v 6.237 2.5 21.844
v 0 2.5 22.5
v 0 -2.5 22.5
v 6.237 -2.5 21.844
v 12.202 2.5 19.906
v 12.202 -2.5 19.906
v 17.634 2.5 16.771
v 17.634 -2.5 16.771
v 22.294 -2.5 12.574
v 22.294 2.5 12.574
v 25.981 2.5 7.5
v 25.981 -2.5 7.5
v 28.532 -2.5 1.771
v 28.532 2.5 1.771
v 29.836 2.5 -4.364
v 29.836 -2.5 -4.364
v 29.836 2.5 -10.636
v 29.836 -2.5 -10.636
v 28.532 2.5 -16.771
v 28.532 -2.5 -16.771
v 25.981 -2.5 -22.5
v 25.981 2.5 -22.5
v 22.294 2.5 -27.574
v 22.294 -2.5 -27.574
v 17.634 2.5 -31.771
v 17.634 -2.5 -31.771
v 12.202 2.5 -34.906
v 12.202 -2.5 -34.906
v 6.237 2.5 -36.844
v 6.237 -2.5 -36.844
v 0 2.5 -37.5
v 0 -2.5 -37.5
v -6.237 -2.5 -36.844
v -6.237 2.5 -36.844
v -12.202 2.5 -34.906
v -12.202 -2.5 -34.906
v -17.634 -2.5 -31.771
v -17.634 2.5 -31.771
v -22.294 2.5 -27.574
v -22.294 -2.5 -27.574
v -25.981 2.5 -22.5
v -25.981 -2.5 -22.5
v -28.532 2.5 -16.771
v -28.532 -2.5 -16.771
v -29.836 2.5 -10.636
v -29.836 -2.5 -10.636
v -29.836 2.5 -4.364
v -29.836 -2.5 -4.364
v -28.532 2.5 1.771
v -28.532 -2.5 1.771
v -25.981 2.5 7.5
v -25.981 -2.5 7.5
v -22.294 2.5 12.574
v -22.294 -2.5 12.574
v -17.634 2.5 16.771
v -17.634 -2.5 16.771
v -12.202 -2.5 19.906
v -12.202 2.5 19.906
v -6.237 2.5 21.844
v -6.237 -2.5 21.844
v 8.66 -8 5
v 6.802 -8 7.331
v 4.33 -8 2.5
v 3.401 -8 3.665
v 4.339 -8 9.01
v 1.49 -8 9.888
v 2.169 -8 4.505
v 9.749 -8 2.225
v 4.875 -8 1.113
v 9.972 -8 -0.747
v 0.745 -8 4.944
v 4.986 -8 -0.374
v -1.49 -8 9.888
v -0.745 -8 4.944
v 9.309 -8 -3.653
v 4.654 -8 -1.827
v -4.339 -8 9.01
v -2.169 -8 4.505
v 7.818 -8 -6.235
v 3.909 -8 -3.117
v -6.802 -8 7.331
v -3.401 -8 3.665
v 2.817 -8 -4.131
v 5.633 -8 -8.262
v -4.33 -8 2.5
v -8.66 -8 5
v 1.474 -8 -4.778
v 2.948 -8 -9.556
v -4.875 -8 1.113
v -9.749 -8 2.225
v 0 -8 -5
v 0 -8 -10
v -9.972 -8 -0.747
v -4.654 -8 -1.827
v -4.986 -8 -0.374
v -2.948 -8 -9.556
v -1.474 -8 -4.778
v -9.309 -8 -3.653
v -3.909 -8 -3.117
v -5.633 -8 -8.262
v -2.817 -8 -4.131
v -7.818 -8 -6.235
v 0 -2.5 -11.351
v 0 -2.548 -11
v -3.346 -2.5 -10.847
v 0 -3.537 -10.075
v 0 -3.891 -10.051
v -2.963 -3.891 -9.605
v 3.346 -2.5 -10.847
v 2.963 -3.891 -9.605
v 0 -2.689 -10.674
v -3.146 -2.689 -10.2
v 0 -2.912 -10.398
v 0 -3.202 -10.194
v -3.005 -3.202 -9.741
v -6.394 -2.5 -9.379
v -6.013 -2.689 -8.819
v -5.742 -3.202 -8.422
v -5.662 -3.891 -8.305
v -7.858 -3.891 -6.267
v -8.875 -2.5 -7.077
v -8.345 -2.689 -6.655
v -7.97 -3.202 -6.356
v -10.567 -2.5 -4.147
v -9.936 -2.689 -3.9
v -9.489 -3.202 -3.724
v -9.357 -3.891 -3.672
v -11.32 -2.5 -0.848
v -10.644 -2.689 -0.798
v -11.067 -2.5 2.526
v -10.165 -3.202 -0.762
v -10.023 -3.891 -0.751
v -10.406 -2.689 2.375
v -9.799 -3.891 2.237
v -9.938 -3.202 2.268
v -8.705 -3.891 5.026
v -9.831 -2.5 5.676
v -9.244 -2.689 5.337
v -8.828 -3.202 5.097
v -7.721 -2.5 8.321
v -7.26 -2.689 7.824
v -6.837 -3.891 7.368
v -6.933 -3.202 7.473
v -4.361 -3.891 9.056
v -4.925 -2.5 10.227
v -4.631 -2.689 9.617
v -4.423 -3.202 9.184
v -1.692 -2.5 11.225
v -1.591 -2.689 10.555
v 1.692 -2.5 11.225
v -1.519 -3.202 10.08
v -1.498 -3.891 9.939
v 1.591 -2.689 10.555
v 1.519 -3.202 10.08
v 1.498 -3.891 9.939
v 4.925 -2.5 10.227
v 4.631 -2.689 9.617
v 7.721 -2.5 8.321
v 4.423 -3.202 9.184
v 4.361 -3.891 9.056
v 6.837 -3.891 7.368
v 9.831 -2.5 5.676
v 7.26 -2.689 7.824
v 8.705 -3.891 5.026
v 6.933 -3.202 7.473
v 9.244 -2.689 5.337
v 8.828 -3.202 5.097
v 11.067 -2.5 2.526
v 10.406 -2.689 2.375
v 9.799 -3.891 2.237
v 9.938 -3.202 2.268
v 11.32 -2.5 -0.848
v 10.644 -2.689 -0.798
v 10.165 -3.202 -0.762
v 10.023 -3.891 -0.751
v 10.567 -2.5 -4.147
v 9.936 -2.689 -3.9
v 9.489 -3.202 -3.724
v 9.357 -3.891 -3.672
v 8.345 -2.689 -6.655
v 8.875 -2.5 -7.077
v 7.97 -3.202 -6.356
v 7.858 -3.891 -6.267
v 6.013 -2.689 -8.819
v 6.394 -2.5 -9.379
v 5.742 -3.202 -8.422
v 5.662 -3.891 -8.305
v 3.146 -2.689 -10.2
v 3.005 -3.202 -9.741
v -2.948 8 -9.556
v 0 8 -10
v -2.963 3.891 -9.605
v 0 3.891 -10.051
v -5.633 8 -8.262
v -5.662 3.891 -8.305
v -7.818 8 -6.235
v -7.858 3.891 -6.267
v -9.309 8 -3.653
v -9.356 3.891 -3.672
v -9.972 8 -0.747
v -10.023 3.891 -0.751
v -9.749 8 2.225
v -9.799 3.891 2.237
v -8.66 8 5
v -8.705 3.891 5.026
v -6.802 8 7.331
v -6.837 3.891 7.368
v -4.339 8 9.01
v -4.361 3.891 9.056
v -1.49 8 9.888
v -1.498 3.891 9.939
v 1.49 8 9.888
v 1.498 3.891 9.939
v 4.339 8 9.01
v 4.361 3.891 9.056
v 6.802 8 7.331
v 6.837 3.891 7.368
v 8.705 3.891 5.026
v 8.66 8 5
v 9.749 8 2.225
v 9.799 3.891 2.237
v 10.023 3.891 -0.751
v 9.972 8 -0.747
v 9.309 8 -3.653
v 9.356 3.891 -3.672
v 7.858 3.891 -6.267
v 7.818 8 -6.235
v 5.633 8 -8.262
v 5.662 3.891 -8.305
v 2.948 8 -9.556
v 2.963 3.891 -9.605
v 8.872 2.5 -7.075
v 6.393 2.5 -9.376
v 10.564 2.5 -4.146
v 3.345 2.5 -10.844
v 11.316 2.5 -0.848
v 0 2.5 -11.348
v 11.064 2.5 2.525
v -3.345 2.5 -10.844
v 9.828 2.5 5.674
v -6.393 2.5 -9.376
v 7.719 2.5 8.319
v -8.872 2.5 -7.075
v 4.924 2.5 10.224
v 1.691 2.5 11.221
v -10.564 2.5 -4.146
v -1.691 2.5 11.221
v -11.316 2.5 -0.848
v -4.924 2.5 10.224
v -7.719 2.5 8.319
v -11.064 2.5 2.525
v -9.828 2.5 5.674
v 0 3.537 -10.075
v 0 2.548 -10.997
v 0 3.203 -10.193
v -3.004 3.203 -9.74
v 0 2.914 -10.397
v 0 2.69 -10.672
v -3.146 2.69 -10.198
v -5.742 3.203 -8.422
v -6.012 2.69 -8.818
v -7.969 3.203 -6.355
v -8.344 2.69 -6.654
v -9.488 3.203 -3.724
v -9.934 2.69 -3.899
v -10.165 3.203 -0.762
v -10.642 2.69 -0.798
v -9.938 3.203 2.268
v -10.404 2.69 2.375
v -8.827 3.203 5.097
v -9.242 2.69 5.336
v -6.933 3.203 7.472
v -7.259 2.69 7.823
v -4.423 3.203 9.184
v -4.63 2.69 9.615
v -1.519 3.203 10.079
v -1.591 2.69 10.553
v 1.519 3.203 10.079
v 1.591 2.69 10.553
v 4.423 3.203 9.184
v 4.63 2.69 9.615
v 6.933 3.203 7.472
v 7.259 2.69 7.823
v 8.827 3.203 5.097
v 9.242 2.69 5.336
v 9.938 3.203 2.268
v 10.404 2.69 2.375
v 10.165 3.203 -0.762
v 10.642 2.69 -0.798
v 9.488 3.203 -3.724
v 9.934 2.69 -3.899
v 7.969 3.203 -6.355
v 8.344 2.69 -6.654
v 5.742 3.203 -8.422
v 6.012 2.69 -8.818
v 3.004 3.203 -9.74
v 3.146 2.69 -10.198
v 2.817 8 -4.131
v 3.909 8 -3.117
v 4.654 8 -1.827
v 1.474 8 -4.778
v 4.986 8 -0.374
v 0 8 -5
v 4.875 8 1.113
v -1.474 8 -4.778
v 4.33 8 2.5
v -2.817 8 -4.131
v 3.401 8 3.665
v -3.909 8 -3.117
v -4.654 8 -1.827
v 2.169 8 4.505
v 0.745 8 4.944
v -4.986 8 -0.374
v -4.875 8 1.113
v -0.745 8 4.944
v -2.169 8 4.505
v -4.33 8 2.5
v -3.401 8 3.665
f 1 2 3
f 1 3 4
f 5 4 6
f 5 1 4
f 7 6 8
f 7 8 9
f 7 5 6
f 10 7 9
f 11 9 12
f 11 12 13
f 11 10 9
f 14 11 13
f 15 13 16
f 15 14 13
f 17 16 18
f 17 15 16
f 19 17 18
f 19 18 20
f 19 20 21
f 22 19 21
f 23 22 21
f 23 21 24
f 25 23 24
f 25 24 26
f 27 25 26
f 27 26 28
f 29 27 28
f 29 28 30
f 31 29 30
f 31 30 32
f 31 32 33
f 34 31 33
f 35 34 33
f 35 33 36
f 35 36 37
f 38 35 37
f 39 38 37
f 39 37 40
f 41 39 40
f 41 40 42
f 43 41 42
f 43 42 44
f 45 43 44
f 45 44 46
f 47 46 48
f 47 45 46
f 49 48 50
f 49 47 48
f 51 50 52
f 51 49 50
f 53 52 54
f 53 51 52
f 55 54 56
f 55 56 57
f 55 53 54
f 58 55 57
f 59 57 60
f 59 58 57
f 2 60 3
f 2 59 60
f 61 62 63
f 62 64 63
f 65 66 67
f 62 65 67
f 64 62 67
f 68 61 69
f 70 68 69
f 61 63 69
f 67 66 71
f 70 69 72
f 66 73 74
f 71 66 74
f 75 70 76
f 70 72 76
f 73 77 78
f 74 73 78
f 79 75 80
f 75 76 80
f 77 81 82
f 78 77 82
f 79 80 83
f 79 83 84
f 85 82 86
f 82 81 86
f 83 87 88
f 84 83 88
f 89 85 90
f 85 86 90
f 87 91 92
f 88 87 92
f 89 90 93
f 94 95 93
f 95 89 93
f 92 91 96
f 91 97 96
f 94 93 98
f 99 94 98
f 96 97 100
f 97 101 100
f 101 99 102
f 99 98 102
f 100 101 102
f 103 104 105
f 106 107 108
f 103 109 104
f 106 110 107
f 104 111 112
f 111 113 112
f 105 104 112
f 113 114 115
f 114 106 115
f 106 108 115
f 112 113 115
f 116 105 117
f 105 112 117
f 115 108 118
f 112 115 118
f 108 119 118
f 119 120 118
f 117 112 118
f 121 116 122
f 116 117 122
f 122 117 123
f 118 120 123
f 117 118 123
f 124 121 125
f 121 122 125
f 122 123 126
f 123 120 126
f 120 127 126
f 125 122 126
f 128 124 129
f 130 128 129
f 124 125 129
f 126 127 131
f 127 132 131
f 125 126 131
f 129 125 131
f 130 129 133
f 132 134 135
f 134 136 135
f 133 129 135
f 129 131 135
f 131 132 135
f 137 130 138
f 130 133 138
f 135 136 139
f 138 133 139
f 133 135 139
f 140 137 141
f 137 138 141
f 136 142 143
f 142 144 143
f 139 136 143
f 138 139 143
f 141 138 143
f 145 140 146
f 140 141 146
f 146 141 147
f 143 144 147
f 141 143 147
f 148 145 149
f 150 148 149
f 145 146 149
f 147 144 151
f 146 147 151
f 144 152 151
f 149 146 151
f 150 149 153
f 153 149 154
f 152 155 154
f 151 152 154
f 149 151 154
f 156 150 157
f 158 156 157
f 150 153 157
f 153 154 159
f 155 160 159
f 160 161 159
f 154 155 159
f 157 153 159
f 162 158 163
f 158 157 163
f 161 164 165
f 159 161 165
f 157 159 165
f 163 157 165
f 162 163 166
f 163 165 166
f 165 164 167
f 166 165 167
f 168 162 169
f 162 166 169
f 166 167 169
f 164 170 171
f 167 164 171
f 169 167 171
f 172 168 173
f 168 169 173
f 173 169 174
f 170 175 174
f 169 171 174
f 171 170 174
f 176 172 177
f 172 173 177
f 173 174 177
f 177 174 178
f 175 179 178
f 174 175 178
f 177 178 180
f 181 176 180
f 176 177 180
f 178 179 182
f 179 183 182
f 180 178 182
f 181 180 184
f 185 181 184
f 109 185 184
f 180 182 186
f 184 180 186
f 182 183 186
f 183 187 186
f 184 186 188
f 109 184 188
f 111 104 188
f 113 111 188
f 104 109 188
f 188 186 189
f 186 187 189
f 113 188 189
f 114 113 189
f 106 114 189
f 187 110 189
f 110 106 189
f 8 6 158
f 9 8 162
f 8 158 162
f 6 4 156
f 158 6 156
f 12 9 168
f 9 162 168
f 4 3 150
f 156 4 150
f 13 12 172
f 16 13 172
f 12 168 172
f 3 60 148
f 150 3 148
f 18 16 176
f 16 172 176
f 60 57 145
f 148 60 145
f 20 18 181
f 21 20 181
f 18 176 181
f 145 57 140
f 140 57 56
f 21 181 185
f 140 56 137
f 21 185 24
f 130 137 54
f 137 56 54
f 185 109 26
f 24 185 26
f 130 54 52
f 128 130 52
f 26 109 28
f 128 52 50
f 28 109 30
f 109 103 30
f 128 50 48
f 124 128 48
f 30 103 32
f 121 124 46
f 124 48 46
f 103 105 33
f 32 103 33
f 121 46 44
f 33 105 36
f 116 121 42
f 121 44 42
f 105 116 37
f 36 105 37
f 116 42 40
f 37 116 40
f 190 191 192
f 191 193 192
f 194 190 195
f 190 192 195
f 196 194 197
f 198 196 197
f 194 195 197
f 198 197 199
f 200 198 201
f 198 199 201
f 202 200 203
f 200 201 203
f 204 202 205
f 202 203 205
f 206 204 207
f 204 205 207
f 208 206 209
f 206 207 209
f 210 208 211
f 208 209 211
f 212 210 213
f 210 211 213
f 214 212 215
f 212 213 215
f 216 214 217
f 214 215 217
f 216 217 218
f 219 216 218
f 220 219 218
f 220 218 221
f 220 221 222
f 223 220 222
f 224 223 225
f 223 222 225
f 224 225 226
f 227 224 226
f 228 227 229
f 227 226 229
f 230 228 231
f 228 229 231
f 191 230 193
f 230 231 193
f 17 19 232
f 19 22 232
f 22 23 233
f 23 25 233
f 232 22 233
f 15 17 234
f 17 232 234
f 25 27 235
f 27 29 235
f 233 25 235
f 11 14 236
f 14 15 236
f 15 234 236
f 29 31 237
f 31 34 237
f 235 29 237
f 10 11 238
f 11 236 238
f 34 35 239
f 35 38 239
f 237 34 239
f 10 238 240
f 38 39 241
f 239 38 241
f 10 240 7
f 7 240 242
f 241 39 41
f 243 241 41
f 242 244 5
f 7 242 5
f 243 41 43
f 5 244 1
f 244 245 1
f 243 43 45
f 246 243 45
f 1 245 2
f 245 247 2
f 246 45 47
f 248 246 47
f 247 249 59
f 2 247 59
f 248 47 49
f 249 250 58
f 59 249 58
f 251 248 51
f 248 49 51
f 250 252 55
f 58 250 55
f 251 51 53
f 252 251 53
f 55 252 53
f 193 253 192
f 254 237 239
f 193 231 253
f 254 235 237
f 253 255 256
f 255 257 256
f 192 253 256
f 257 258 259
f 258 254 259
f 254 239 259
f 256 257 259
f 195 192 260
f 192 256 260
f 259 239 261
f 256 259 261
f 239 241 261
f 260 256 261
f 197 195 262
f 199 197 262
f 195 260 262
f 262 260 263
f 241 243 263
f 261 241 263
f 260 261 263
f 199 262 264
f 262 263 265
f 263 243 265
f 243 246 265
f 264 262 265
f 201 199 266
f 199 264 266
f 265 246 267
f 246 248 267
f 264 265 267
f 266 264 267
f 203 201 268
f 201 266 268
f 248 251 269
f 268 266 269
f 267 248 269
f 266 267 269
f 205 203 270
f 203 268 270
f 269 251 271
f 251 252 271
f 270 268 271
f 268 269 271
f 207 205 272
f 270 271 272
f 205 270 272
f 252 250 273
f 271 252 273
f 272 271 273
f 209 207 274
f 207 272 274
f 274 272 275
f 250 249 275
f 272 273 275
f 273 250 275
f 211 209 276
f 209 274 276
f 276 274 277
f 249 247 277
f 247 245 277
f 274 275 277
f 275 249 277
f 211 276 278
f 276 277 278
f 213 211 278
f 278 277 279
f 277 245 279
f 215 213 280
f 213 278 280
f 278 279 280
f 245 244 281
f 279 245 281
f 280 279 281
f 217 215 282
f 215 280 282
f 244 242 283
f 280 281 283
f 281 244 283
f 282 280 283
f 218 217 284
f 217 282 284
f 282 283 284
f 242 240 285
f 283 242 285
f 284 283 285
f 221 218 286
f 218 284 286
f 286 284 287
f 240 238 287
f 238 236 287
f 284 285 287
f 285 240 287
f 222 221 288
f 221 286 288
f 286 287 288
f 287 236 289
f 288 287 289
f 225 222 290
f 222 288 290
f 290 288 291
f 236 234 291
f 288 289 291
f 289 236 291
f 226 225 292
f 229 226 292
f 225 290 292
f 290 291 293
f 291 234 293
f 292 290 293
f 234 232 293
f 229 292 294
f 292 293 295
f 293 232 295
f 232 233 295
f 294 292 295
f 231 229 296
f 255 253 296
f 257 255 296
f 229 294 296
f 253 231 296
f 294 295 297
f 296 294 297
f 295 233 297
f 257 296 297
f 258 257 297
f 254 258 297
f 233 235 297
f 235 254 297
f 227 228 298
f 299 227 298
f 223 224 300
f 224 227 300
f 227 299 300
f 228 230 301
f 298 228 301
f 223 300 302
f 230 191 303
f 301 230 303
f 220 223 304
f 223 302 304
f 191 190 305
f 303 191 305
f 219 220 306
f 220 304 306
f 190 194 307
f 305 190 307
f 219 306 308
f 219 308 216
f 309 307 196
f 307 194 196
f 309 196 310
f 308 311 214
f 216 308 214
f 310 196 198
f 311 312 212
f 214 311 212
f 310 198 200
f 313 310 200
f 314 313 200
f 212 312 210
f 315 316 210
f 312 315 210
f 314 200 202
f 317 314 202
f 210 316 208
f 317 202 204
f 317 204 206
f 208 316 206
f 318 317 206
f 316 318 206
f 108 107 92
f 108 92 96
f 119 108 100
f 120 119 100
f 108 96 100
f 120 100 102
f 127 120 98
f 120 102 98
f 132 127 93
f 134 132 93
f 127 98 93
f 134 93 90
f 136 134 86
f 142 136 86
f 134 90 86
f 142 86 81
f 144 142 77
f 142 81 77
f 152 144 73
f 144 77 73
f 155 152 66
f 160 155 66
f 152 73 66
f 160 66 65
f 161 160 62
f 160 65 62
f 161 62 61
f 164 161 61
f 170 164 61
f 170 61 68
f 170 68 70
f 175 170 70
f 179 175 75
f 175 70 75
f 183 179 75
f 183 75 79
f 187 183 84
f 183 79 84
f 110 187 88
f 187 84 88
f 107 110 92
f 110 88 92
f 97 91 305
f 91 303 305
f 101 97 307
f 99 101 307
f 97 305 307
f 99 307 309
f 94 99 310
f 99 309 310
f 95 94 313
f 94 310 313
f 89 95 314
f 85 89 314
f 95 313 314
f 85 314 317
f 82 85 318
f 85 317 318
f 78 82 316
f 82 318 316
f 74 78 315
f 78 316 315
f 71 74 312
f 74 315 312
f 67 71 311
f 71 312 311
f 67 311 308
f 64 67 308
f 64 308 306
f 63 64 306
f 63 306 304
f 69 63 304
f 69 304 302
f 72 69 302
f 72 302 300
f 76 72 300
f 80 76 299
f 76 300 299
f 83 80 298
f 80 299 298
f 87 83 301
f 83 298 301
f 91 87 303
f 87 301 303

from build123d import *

# Parameters (mm, degrees)
CROQUIS4_OUTSIDE_W    = 159.554
CROQUIS4_OUTSIDE_H    = 159.554
CROQUIS4_OUTSIDE_R    = 30
CORTAR_EXTRUIR9_DEPTH = 10


with BuildPart() as part:
    # Croquis1 → Revolución1 (revolve)
    with BuildSketch(Plane.XY, mode=Mode.PRIVATE) as revoluci_n1_sk:
        with BuildLine():
            Line((5, 8), (10, 8))
            Line((10, 8), (10.051225386, 3.891))
            ThreePointArc((10.051225386, 3.891), (10.39716845, 2.91351819), (11.348036475, 2.5))
            Line((11.348036475, 2.5), (61.351351351, 2.5))
            Line((61.351351351, 2.5), (61.351351351, -2.5))
            Line((61.351351351, -2.5), (11.351351351, -2.5))
            ThreePointArc((11.351351351, -2.5), (10.398380886, -2.912350032), (10.051351351, -3.891))
            Line((10.051351351, -3.891), (10, -8))
            Line((10, -8), (5, -8))
            Line((5, -8), (5, 8))
        make_face()
    revolve(revoluci_n1_sk.sketch.rotate(Axis((0, -587.784635029, 0), (0, 1, 0)), 90), axis=Axis((0, -587.784635029, 0), (0, 1, 0)))

    # Croquis4 outside → Cortar-Extruir9 (cut)
    with BuildSketch(Plane(origin=(0, 2.5, 0), x_dir=(1, 0, 0), z_dir=(0, 1, 0))):
        Rectangle(CROQUIS4_OUTSIDE_W, CROQUIS4_OUTSIDE_H)
        with Locations(Location((0, 7.5, 0), (0, 0, 270))):
            Circle(CROQUIS4_OUTSIDE_R, mode=Mode.SUBTRACT)
    extrude(amount=-CORTAR_EXTRUIR9_DEPTH, mode=Mode.SUBTRACT)


solid = part.part
